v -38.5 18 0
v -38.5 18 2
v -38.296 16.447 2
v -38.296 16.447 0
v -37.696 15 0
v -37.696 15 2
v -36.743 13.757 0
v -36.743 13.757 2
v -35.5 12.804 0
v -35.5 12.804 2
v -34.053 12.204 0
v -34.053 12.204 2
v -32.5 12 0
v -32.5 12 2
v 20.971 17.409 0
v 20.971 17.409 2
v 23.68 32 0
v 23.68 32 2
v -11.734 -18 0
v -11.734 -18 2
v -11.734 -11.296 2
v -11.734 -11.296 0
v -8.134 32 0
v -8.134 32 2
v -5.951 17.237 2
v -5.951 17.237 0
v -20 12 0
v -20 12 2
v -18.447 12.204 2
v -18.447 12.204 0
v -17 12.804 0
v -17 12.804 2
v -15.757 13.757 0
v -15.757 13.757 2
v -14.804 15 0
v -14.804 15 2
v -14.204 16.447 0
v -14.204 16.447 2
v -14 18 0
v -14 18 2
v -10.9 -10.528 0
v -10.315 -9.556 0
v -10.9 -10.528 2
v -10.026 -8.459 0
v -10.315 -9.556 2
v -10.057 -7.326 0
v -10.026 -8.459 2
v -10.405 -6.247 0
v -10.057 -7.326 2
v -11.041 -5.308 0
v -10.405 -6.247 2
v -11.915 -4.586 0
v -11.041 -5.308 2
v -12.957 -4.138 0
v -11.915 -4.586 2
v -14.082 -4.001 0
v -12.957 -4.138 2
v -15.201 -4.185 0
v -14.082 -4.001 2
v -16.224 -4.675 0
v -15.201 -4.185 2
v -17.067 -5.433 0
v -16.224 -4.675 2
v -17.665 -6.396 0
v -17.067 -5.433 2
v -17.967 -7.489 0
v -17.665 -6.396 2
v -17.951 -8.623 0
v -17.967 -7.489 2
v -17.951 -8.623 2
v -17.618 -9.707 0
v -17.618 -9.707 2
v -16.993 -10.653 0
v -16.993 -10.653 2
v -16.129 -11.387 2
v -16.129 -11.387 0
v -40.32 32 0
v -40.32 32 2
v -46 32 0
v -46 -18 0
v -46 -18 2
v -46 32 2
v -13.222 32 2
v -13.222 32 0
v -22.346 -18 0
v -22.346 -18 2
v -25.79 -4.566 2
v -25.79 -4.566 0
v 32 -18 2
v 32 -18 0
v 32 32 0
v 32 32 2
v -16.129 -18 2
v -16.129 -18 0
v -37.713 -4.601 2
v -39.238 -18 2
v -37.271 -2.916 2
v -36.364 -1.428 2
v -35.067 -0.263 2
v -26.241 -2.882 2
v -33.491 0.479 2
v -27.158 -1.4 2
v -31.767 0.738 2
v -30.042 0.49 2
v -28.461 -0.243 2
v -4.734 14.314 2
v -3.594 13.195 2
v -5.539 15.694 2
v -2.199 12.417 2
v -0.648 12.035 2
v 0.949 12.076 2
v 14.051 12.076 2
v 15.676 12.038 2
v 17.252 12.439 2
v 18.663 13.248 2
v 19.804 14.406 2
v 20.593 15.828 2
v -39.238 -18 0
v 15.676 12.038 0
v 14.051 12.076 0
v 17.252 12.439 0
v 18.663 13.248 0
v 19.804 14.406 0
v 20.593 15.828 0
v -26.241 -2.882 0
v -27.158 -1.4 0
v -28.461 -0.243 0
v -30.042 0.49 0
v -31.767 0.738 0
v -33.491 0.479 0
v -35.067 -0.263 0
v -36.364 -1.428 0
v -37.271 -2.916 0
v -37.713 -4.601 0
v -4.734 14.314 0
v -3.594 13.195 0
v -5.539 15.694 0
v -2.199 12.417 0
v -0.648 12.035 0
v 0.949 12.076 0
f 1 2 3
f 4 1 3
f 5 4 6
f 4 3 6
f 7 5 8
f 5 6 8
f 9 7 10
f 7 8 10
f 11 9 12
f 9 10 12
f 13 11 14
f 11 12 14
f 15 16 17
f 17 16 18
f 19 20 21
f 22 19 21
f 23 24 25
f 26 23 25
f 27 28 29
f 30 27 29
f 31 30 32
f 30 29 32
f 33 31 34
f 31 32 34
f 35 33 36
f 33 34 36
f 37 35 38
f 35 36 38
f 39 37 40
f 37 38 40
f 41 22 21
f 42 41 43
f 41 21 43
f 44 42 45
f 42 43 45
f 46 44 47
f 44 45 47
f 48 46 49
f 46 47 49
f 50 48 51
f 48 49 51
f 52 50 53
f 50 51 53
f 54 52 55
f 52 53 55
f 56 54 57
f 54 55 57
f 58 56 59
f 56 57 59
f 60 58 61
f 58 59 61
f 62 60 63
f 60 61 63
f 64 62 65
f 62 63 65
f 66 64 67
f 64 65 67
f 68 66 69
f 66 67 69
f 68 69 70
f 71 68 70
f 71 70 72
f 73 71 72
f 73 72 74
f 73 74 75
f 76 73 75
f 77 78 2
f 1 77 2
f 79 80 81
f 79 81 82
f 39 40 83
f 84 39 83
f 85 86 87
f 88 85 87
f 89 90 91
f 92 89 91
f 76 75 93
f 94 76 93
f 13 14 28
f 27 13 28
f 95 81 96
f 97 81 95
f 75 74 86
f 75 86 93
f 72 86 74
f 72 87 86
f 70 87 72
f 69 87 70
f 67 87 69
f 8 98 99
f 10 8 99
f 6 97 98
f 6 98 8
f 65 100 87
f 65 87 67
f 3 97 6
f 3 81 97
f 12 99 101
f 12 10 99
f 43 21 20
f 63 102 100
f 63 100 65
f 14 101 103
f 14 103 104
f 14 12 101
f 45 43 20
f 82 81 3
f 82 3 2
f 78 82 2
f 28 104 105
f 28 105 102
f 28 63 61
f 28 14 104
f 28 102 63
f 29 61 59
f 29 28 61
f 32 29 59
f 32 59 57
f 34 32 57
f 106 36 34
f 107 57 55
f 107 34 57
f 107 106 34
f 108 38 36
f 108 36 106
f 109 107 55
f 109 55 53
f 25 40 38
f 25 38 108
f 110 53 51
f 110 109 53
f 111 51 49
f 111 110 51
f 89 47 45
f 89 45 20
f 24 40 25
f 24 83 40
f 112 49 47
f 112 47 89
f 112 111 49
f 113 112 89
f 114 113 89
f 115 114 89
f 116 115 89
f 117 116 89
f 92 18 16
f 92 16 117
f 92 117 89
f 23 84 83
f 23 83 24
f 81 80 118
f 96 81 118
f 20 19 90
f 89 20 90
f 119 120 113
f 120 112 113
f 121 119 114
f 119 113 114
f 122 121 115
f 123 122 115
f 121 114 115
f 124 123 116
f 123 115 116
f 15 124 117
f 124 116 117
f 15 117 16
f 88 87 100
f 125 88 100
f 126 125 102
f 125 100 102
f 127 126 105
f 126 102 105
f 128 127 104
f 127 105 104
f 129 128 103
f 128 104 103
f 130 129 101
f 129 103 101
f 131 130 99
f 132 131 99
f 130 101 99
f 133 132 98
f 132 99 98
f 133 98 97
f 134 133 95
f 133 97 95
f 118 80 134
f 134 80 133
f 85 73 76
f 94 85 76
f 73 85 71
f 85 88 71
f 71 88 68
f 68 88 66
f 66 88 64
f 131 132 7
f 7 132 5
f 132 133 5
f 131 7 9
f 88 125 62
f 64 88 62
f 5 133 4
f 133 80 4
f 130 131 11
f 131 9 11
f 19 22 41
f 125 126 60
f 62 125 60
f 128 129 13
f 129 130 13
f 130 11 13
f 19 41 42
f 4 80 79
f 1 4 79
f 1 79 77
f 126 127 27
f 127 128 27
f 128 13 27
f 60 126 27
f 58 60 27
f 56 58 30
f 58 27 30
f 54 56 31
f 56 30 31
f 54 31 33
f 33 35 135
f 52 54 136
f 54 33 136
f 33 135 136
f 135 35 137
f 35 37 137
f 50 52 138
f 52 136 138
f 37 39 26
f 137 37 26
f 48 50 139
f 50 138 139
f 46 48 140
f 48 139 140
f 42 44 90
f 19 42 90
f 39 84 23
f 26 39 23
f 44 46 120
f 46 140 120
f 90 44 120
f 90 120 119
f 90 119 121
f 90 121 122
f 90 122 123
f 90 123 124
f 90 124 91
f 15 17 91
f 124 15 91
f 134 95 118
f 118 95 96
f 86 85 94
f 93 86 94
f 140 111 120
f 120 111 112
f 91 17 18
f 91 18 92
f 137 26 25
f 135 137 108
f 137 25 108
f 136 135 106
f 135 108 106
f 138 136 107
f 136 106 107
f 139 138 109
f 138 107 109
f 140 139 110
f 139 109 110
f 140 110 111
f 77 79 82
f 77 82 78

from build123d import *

# Parameters (mm, degrees)
SKETCH_1_W          = 78
SKETCH_1_H          = 50
EXTRUDE_1_DEPTH     = 2
SKETCH_2_R          = 6
SKETCH_2_R_2        = 4
CUT_EXTRUDE_2_DEPTH = 3
CUT_EXTRUDE_3_DEPTH = 3


with BuildPart() as part:
    # Эскиз1 → Бобышка-Вытянуть1 (new body)
    with BuildSketch(Plane.XY):
        with Locations((-7, 7)):
            Rectangle(SKETCH_1_W, SKETCH_1_H)
    extrude(amount=EXTRUDE_1_DEPTH)

    # Эскиз2 → Вырез-Вытянуть2 (cut, through all)
    with BuildSketch(Plane.XY.offset(2)):
        with Locations((-32.5, 18)):
            Circle(SKETCH_2_R)
        with Locations((-20, 18)):
            Circle(SKETCH_2_R)
        with Locations((0, 18)):
            Circle(SKETCH_2_R)
        with Locations((15, 18)):
            Circle(SKETCH_2_R)
        with Locations((-14, -8)):
            Circle(SKETCH_2_R_2)
        with Locations((-31.749315539, -5.262317493)):
            Circle(SKETCH_2_R)
    extrude(amount=-CUT_EXTRUDE_2_DEPTH, mode=Mode.SUBTRACT)

    # Эскиз3 → Вырез-Вытянуть3 (cut, through all)
    with BuildSketch(Plane.XY.offset(2)):
        Polygon((-37.708738379, -4.565697495), (-39.23827254, -18), (-22.345634052, -18), (-25.7898927, -4.565697495), align=None)
        Polygon((-16.128623671, -11.386585488), (-16.128623671, -18), (-11.733531884, -18), (-11.733531884, -11.295925102), align=None)
        Polygon((-40.319551463, 32), (-38.5, 18), (-32.5, 12), (-20, 12), (-14, 18), (-13.221505596, 32), align=None)
        Polygon((-8.134373627, 32), (-5.917388606, 17.007774179), (-0.949072404, 12.075537022), (15.949072404, 12.075537022), (20.784965527, 16.40809113), (23.68000723, 32), align=None)
    extrude(amount=-CUT_EXTRUDE_3_DEPTH, mode=Mode.SUBTRACT)


solid = part.part
